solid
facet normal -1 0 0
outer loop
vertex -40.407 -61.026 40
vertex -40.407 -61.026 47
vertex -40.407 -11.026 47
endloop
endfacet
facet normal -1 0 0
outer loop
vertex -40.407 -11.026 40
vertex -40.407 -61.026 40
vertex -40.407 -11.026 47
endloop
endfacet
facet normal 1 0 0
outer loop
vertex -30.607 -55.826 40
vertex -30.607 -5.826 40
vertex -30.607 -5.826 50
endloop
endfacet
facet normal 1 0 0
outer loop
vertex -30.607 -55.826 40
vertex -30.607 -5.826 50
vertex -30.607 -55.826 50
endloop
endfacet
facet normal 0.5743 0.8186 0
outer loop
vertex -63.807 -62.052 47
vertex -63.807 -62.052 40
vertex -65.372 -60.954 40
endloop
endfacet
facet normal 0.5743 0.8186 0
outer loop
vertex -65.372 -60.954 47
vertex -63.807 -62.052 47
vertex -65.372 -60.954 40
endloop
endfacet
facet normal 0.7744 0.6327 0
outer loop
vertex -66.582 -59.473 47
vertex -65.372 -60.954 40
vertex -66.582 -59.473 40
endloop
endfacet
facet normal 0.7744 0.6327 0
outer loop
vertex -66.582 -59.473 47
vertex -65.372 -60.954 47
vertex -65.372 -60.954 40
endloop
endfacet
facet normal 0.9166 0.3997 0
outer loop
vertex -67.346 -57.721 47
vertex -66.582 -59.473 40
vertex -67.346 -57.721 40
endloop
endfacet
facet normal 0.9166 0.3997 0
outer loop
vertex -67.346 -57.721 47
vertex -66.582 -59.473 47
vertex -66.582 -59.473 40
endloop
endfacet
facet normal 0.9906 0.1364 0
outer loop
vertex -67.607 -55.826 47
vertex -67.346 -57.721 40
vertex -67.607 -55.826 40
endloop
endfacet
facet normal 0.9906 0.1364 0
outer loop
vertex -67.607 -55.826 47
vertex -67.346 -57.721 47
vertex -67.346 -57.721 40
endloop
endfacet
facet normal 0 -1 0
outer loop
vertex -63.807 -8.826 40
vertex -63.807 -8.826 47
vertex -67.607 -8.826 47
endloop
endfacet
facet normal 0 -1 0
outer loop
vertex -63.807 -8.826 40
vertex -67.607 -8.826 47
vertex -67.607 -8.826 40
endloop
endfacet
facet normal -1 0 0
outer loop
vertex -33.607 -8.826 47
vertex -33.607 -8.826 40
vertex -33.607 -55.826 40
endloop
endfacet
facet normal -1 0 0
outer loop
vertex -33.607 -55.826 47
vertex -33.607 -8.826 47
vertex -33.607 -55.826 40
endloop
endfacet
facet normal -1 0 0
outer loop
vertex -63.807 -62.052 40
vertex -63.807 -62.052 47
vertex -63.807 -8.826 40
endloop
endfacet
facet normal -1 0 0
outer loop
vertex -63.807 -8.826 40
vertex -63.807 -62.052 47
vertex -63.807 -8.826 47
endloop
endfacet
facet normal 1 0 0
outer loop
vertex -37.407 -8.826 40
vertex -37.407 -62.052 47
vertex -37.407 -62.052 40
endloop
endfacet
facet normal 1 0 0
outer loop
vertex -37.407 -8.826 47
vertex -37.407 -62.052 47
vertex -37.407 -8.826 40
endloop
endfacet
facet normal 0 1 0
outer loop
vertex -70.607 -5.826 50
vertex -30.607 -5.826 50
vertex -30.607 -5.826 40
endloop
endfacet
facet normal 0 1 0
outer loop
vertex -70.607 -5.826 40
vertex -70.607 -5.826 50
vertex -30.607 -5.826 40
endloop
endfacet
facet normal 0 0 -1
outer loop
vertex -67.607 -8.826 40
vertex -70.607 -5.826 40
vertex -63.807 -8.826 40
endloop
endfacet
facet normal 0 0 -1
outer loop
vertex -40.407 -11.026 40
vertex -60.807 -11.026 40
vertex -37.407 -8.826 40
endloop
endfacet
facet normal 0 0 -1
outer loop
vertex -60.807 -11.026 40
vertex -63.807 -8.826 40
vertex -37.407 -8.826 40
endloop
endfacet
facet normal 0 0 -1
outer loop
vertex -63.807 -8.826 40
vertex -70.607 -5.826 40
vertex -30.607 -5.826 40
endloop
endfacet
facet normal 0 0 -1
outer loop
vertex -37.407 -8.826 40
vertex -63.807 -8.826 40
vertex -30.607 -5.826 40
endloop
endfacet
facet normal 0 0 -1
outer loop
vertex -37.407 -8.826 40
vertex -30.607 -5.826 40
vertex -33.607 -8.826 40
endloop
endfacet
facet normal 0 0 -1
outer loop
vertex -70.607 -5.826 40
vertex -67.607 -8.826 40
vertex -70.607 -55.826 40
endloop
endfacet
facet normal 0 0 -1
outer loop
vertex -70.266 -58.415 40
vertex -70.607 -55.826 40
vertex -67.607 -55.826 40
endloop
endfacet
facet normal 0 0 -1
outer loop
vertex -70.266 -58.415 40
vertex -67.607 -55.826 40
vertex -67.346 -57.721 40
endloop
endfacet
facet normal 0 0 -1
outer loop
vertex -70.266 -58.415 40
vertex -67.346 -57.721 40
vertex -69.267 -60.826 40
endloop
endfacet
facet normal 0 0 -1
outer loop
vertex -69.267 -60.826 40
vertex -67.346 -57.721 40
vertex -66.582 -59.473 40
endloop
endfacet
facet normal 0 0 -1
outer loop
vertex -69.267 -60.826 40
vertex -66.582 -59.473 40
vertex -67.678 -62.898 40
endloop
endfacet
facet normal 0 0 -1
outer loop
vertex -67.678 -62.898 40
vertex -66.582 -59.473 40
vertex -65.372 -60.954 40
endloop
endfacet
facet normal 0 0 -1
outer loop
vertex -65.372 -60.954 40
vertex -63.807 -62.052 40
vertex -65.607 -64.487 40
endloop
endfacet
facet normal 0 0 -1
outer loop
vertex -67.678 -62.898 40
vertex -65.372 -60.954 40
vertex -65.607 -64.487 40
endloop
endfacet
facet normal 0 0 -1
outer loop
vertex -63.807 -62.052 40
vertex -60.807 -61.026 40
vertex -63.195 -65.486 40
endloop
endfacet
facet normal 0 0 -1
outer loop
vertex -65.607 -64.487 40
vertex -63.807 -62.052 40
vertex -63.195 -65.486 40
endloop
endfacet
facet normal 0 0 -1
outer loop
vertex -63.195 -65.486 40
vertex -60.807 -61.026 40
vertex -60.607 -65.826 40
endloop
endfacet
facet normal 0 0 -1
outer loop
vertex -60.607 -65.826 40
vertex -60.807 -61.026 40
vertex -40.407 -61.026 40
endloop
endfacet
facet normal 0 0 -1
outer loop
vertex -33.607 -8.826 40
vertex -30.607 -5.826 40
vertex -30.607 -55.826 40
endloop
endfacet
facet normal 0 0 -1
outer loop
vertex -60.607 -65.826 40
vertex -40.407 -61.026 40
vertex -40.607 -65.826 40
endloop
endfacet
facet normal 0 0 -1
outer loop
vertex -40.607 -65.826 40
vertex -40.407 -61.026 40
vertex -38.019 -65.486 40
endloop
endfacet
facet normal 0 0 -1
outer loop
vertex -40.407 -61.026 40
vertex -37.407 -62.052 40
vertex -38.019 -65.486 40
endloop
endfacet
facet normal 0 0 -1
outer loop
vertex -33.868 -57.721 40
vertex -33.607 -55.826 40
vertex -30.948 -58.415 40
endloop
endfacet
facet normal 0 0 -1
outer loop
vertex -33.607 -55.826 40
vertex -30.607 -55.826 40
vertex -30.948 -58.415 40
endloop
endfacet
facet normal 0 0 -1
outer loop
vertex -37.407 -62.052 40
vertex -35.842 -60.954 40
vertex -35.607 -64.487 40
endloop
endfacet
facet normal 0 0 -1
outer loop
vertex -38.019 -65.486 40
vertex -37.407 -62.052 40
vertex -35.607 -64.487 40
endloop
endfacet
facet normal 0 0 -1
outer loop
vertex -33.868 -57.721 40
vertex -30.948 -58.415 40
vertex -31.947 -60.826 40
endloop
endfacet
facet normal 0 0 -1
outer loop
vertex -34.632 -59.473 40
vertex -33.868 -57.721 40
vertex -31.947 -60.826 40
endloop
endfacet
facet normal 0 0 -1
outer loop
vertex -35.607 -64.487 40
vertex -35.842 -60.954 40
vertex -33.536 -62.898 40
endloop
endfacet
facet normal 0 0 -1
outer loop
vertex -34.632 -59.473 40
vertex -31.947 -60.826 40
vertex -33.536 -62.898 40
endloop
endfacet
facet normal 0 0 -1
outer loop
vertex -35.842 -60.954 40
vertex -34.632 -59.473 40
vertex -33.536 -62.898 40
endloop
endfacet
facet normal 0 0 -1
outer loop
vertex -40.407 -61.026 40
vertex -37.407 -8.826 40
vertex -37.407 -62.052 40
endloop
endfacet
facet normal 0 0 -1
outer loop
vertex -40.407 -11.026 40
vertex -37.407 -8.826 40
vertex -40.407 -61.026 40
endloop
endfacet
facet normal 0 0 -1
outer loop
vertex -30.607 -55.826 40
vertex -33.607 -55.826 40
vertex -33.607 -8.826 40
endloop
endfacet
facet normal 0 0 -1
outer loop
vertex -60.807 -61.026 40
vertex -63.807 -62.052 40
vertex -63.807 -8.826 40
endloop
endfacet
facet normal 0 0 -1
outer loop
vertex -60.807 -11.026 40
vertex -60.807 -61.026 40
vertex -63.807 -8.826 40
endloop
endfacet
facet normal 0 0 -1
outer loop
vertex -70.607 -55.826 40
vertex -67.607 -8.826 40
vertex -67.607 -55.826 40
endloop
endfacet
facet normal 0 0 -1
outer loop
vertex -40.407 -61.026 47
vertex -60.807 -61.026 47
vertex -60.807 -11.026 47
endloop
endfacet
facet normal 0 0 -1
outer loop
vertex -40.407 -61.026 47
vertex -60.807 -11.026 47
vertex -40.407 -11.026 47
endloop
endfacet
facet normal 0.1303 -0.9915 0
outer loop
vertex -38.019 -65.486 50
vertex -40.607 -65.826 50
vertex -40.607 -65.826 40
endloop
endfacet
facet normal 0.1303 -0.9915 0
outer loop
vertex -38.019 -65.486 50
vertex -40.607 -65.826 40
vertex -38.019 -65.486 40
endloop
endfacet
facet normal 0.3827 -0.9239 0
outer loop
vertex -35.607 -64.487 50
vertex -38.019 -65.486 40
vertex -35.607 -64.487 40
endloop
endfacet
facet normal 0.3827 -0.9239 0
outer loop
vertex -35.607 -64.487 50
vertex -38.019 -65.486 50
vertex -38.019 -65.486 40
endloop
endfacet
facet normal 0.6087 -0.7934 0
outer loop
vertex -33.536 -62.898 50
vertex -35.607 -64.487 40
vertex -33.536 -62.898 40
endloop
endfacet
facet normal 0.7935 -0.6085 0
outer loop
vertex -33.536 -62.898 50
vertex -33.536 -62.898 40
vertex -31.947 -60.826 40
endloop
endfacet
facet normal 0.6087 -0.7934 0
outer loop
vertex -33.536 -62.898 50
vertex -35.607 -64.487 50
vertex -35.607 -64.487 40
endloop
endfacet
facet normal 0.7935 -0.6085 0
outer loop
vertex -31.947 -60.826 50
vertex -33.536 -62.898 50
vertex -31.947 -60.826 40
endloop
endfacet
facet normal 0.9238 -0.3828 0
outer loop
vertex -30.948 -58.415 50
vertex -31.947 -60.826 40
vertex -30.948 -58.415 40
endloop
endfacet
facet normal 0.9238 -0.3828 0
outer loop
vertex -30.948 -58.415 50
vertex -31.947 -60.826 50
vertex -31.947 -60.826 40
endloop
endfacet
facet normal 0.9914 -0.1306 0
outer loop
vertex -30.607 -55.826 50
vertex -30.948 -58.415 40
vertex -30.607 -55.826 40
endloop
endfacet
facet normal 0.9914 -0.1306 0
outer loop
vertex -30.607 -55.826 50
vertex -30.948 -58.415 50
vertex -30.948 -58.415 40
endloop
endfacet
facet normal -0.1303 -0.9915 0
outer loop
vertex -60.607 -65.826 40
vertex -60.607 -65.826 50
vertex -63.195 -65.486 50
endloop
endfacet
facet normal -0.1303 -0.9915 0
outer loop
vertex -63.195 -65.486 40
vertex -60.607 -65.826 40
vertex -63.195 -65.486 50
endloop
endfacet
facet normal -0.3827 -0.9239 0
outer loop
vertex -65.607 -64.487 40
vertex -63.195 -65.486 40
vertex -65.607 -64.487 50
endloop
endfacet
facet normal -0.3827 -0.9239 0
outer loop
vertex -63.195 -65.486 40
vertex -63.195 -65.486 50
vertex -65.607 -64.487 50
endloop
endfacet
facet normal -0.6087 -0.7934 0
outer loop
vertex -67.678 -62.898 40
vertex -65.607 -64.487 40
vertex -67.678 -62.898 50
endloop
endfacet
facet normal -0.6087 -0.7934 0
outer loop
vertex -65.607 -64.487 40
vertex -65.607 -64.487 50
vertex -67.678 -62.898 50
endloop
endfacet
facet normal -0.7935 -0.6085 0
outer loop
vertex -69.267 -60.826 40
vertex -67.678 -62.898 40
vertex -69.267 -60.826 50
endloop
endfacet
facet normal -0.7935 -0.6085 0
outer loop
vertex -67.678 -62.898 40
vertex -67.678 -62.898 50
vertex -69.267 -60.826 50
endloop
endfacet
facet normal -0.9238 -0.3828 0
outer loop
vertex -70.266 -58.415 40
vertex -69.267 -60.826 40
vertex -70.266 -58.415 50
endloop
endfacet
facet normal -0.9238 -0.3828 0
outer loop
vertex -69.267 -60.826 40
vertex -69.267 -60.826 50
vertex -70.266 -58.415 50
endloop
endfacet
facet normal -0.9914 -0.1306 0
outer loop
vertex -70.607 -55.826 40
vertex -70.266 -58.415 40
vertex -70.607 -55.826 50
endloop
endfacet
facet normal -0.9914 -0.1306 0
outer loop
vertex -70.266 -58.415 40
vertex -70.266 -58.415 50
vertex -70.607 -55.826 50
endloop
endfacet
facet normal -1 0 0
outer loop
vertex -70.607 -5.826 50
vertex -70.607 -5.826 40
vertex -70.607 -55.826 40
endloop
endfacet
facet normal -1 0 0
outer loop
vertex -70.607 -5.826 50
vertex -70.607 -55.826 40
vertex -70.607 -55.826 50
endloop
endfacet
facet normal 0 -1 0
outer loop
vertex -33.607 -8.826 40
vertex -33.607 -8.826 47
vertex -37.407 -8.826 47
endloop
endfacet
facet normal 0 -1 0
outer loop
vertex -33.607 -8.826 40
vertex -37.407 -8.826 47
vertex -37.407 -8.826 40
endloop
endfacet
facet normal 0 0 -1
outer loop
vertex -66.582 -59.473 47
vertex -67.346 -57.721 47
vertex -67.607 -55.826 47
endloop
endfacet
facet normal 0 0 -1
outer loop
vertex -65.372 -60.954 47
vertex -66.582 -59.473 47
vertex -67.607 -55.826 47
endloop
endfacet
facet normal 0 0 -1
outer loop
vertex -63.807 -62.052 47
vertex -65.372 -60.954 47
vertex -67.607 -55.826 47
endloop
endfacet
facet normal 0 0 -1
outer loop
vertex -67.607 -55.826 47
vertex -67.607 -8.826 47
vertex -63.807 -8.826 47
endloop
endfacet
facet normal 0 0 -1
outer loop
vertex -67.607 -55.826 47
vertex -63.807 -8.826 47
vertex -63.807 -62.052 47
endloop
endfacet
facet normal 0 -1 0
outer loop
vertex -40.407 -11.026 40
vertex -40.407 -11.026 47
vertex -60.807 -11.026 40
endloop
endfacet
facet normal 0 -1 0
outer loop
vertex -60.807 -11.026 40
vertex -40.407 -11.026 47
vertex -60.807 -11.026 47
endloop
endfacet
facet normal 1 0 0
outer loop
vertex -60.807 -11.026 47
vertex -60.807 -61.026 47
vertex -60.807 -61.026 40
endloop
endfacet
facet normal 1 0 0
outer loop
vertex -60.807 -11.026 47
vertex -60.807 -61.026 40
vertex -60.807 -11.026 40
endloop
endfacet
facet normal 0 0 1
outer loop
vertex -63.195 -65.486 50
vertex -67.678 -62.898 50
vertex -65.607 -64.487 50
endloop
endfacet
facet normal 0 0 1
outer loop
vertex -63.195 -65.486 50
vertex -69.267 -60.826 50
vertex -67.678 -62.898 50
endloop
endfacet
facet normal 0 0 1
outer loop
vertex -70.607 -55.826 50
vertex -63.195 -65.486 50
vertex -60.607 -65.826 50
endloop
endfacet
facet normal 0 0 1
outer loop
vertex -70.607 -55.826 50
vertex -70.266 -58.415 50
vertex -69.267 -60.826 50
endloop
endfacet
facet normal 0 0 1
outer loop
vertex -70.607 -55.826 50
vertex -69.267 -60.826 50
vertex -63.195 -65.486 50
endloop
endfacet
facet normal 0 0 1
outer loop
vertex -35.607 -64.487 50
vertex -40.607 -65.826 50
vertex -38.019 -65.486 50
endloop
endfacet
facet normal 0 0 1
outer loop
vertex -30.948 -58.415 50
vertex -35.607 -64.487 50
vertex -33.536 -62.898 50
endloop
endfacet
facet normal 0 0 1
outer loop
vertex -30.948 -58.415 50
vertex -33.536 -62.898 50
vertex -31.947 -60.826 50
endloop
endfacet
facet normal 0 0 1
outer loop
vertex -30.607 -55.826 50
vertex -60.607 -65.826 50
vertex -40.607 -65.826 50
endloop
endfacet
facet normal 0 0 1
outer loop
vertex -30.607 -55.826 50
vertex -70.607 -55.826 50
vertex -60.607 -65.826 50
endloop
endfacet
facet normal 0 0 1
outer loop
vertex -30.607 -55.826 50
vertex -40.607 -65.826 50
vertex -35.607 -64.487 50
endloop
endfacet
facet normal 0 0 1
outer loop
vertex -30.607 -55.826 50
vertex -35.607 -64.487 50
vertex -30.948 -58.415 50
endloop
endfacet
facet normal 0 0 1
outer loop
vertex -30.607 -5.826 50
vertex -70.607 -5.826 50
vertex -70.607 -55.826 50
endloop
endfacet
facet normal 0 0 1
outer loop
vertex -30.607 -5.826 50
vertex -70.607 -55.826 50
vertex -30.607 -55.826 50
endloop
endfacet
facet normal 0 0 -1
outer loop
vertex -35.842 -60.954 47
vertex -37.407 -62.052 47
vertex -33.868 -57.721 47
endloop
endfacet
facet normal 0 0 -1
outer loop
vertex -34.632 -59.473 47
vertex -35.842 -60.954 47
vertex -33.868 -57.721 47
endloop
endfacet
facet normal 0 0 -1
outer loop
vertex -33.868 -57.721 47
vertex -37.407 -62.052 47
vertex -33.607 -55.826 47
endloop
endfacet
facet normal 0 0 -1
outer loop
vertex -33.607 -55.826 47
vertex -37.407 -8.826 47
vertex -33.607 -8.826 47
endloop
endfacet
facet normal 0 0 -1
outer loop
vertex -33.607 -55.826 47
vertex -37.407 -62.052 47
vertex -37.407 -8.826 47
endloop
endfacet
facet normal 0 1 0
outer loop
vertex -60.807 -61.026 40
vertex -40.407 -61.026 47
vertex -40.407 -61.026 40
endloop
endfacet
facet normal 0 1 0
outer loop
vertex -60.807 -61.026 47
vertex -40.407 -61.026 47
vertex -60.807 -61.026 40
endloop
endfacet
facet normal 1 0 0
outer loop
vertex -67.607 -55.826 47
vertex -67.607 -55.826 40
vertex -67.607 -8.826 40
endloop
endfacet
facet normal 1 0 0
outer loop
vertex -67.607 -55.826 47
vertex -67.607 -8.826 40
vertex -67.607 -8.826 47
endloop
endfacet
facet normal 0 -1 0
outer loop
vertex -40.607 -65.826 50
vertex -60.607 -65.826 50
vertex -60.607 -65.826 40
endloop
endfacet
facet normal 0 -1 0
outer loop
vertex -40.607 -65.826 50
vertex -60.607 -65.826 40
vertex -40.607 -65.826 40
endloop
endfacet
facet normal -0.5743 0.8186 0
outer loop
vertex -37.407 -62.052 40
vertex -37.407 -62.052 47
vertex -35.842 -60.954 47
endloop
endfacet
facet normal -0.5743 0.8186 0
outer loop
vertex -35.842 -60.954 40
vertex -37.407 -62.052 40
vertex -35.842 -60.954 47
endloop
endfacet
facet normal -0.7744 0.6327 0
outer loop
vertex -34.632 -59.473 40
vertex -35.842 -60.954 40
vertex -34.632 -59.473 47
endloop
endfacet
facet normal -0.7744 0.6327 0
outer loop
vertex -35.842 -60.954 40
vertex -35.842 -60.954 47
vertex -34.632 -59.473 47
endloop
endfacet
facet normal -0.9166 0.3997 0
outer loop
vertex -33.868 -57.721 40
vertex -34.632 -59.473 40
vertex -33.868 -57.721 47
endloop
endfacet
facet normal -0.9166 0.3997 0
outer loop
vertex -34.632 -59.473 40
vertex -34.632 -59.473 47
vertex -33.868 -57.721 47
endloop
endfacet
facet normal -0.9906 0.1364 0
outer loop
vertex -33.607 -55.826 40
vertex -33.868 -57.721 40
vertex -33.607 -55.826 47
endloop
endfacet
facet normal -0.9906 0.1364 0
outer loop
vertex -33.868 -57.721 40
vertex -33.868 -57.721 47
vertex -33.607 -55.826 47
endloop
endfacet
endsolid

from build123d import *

# Parameters (mm, degrees)
SALIENTE_EXTRUIR1_DEPTH      = 50
CROQUIS2_W                   = 40
CROQUIS2_H                   = 50
SALIENTE_EXTRUIR2_DEPTH      = 60
SALIENTE_EXTRUIR2_DEPTH_BACK = 31
REDONDEO1_R                  = 10
REDONDEO2_R                  = 10
CORTAR_EXTRUIR1_DEPTH        = 74
VACIADO1_T                   = -3
CROQUIS4_W                   = 26.4
CROQUIS4_H                   = 56
CROQUIS4_W_2                 = 20.4
CROQUIS4_H_2                 = 50
SALIENTE_EXTRUIR3_DEPTH      = 7


with BuildPart() as part:
    # Croquis1 → Saliente-Extruir1 (new body)
    with BuildSketch(Plane.XY):
        with BuildLine():
            Line((-80.606796451, 54.173553719), (-40.606796451, 54.173553719))
            ThreePointArc((-40.606796451, 54.173553719), (-33.53572864, 51.244621531), (-30.606796451, 44.173553719))
            Line((-30.606796451, 44.173553719), (-30.606796451, 4.173553719))
            ThreePointArc((-30.606796451, 4.173553719), (-33.53572864, -2.897514093), (-40.606796451, -5.826446281))
            Line((-40.606796451, -5.826446281), (-80.606796451, -5.826446281))
            ThreePointArc((-80.606796451, -5.826446281), (-87.677864263, -2.897514093), (-90.606796451, 4.173553719))
            Line((-90.606796451, 4.173553719), (-90.606796451, 44.173553719))
            ThreePointArc((-90.606796451, 44.173553719), (-87.677864263, 51.244621531), (-80.606796451, 54.173553719))
        make_face()
    extrude(amount=SALIENTE_EXTRUIR1_DEPTH)

    # Croquis2 → Saliente-Extruir2 (add, two sides)
    with BuildSketch(Plane.XZ.offset(5.826446281)) as saliente_extruir2_sk:
        with Locations((-50.606796451, 25)):
            Rectangle(CROQUIS2_W, CROQUIS2_H)
    extrude(amount=SALIENTE_EXTRUIR2_DEPTH)
    extrude(saliente_extruir2_sk.sketch, amount=-SALIENTE_EXTRUIR2_DEPTH_BACK)

    # Redondeo1
    redondeo1_edges = [part.edges().sort_by_distance(p)[0] for p in [
        (-30.606796451, -65.826446281, 25),
    ]]
    fillet(redondeo1_edges, radius=REDONDEO1_R)

    # Redondeo2
    redondeo2_edges = [part.edges().sort_by_distance(p)[0] for p in [
        (-70.606796451, -65.826446281, 25),
    ]]
    fillet(redondeo2_edges, radius=REDONDEO2_R)

    # Croquis3 → Cortar-Extruir1 (cut)
    with BuildSketch(Plane(origin=(-30.606796451, 0, 0), x_dir=(0, 0, -1), z_dir=(1, 0, 0))):
        Polygon((-40, -65.826446281), (-40, -5.826446281), (-50, -5.826446281), (-90.954417086, -5.826446281), (-90.954417086, 59.755258828), (17.577829589, 59.755258828), (17.577829589, -73.598263991), (-40, -73.598263991), align=None)
    extrude(amount=-CORTAR_EXTRUIR1_DEPTH, mode=Mode.SUBTRACT)

    # Vaciado1
    vaciado1_openings = [part.faces().sort_by_distance(p)[0] for p in [
        (-50.606796451, -43.183468885, 40),
    ]]
    offset(amount=VACIADO1_T, openings=vaciado1_openings, kind=Kind.INTERSECTION)

    # Croquis4 → Saliente-Extruir3 (add)
    with BuildSketch(Plane(origin=(0, 0, 47), x_dir=(-1, 0, 0), z_dir=(0, 0, -1))):
        with Locations((50.606796451, -36.026446281)):
            Rectangle(CROQUIS4_W, CROQUIS4_H)
        with Locations((50.606796451, -36.026446281)):
            Rectangle(CROQUIS4_W_2, CROQUIS4_H_2, mode=Mode.SUBTRACT)
    extrude(amount=SALIENTE_EXTRUIR3_DEPTH)


solid = part.part
